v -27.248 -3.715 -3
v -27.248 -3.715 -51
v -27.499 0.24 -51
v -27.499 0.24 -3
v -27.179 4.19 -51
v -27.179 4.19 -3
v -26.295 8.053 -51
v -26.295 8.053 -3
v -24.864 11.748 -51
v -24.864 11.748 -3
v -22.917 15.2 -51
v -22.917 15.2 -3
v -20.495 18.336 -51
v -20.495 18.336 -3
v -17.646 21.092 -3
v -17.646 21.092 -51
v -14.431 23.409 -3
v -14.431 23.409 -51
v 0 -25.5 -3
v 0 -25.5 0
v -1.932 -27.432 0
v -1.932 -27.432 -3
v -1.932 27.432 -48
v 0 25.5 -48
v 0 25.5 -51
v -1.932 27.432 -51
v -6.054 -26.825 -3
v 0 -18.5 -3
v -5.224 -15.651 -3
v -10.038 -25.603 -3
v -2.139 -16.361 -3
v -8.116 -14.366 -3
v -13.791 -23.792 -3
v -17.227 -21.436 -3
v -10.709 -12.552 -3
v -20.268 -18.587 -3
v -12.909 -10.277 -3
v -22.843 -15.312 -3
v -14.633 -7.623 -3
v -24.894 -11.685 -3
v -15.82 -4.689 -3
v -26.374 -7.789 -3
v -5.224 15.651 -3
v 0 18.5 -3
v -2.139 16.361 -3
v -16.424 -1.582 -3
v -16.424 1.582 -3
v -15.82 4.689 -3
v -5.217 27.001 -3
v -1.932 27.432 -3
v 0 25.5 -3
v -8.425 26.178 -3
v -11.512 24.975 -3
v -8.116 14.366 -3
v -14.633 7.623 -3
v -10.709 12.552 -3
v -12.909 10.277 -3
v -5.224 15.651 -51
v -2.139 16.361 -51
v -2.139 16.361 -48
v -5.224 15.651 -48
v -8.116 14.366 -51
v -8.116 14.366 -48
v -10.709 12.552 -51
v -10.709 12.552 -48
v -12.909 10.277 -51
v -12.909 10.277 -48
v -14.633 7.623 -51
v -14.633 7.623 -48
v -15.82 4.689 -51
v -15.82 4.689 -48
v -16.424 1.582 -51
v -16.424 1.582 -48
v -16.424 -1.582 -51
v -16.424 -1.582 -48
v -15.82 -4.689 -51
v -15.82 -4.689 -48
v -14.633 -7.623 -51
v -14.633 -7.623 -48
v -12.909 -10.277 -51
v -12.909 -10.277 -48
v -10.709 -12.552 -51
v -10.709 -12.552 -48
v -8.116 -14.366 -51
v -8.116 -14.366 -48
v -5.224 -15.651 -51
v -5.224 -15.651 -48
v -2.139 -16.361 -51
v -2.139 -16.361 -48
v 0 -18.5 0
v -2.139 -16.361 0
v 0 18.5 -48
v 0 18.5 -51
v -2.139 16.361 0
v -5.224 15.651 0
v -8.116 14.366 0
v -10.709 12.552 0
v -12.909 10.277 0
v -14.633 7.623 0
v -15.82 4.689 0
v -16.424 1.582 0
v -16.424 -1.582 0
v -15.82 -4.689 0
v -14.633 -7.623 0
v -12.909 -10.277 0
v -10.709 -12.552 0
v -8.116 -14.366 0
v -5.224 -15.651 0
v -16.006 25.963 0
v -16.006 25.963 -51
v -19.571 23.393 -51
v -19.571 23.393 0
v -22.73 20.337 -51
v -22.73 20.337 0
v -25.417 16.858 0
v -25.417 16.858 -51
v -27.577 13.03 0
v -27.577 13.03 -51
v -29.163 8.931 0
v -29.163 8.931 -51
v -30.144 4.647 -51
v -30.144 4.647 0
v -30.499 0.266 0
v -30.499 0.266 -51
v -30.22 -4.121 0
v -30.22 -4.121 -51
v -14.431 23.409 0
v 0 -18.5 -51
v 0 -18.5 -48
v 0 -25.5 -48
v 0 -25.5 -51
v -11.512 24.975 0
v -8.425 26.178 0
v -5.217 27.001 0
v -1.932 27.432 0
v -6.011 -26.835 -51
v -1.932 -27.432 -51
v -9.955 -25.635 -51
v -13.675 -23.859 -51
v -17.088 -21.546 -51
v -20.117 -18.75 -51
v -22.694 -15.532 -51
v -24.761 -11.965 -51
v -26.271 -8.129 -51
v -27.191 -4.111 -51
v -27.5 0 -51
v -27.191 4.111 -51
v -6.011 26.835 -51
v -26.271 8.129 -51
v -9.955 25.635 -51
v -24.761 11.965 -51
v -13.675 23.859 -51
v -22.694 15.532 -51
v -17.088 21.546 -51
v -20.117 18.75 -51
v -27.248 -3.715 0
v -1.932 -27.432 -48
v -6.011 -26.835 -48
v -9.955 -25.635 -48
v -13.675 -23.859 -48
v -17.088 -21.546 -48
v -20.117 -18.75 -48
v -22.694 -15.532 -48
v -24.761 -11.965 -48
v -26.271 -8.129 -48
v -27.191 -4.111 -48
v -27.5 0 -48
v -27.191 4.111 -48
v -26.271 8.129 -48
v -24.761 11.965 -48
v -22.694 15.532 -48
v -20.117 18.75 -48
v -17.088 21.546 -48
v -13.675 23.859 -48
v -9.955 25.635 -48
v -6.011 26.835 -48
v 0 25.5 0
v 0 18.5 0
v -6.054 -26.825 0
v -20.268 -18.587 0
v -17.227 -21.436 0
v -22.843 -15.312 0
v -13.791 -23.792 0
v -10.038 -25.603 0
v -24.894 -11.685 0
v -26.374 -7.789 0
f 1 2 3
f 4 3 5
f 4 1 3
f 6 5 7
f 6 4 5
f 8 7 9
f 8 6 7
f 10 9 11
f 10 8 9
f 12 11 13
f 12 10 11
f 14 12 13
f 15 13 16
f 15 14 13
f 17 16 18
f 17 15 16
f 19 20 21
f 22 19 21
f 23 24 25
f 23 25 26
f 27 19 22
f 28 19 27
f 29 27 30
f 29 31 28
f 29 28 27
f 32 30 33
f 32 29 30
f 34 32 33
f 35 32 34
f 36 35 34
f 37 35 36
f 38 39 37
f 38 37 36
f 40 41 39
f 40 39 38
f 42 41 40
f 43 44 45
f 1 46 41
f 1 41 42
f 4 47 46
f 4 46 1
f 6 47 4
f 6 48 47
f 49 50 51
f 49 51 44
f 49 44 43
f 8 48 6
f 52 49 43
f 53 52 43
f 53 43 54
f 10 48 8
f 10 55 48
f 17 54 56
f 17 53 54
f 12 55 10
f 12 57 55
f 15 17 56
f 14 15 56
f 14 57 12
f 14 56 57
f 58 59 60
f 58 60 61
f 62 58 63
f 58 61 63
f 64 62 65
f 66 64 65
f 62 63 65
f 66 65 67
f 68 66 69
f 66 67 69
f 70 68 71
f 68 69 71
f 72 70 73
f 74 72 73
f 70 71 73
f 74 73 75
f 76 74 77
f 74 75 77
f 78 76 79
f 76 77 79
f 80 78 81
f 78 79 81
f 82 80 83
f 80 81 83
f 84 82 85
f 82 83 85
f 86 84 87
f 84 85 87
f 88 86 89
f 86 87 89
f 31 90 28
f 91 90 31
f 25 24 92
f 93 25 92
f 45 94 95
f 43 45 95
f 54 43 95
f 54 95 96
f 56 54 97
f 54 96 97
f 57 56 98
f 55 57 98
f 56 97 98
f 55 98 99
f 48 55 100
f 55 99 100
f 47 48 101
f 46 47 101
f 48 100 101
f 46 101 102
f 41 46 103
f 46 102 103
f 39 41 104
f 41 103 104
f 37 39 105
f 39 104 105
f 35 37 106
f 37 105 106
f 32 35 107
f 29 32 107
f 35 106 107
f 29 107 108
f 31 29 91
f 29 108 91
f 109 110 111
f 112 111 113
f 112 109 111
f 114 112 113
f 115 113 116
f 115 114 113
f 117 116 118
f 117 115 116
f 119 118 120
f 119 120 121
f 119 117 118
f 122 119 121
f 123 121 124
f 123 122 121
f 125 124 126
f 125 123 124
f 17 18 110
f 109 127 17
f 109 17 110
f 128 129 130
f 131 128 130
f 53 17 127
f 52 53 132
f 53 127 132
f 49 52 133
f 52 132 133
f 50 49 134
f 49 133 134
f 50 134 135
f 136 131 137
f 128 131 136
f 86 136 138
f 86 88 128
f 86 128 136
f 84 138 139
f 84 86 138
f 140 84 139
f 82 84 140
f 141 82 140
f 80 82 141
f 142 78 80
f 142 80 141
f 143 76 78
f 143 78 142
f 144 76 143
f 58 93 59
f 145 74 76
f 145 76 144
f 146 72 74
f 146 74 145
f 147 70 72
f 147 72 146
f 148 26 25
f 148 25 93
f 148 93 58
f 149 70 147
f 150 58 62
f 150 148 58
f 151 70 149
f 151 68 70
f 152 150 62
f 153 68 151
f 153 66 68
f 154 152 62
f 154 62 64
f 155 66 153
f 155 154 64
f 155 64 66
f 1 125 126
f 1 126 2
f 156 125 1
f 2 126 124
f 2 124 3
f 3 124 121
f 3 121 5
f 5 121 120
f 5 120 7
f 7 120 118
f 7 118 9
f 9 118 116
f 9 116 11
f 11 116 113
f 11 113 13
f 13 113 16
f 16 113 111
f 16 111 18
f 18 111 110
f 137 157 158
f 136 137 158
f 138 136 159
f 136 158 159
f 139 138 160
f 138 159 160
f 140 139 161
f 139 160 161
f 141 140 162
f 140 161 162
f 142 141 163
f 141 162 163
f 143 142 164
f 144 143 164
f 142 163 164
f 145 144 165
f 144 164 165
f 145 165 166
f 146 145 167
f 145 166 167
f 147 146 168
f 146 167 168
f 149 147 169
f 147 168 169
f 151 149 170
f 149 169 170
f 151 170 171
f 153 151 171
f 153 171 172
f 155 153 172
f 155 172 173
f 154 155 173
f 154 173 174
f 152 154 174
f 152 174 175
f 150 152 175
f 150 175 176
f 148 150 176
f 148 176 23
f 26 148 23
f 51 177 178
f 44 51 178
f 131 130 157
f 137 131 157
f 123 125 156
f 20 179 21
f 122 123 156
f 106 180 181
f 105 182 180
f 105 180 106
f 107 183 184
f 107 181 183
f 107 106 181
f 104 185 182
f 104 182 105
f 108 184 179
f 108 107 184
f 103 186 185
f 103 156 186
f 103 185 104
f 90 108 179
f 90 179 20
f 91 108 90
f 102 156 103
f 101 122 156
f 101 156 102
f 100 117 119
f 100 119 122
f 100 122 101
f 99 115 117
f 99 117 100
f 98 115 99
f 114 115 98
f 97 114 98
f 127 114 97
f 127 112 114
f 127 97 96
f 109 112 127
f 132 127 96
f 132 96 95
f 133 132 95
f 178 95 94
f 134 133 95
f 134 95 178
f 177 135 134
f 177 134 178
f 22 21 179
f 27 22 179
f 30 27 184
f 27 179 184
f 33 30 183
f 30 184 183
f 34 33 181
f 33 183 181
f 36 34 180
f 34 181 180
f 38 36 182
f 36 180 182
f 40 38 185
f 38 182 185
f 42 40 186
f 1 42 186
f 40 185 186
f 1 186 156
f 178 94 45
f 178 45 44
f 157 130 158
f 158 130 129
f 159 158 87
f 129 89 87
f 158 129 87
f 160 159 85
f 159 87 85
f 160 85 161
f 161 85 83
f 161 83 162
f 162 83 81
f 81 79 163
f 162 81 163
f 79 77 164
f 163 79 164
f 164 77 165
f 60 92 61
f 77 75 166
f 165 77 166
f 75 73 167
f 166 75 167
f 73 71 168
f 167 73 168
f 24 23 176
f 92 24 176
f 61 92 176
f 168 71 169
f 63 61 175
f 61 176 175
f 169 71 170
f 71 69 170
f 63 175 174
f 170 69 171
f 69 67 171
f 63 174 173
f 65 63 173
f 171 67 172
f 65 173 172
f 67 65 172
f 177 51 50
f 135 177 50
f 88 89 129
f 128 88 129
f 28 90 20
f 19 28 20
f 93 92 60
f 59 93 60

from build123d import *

# Parameters (mm, degrees)
BASE_FLANGE1_DEPTH  = 3
BOSS_EXTRUDE1_DEPTH = 51
BASE_FLANGE2_START  = -3
BASE_FLANGE2_DEPTH  = 3
CHAMFER1_SIZE       = 2
CHAMFER2_SIZE       = 2


# Sheet-metal steps are written as plain solids
with BuildPart() as part:
    # Base-Flange1: sheet metal written as solids
    # Sketch1 → Base-Flange1 (new body)
    with BuildSketch(Plane.XY):
        with BuildLine():
            Line((0, 27.5), (0, 16.5))
            ThreePointArc((0, 16.5), (-16.5, 0), (0, -16.5))
            Line((0, -16.5), (0, -27.5))
            ThreePointArc((0, -27.5), (-27.5, 0), (0, 27.5))
        make_face()
    extrude(amount=-BASE_FLANGE1_DEPTH)

    # Sketch6 → Boss-Extrude1 (add)
    with BuildSketch(Plane.XY):
        with BuildLine():
            Line((-14.431370788, 23.409090909), (-16.005702146, 25.962809917))
            ThreePointArc((-16.005702146, 25.962809917), (-27.576558365, 13.030097036), (-30.220353458, -4.120708299))
            Line((-30.220353458, -4.120708299), (-27.247859675, -3.715392728))
            ThreePointArc((-27.247859675, -3.715392728), (-24.864110001, 11.748448147), (-14.431370788, 23.409090909))
        make_face()
    extrude(amount=-BOSS_EXTRUDE1_DEPTH)

    # Chamfer1
    # the kernel refuses this chamfer: 2 mm, written as the material it takes off along each edge
    with BuildSketch(Plane(origin=(0, 27.5, 5.143365976), x_dir=(0, -1, 0), z_dir=(0, 0, -1))) as chamfer1_piece_1:
        with BuildLine():
            Line((CHAMFER1_SIZE, 0), (0.06795314, 1.93204686))
            ThreePointArc((0.06795314, 1.93204686), (0.017965239, 0.993863861), (0, 0))
            Line((0, 0), (CHAMFER1_SIZE, 0))
        make_face()
    extrude(amount=13.286731952, mode=Mode.SUBTRACT)
    with BuildSketch(Plane(origin=(0, 16.5, 5.511382139), x_dir=(-0.9978876375482535, -0.06496354999817457, 0), z_dir=(0, 0, -1))) as chamfer1_piece_2:
        with BuildLine():
            Line((2.14379715, 0), (-CHAMFER1_SIZE * 0.0649635499982, CHAMFER1_SIZE * 0.997887637548))
            Line((-CHAMFER1_SIZE * 0.0649635499982, CHAMFER1_SIZE * 0.997887637548), (0, 0))
            ThreePointArc((0, 0), (1.102072489, 0.034826391), (2.14379715, 0))
        make_face()
    extrude(amount=14.022764278, mode=Mode.SUBTRACT)
    with BuildSketch(Plane(origin=(0, -16.5, 5.511382139), x_dir=(0, -1, 0), z_dir=(0, 0, -1))) as chamfer1_piece_3:
        with BuildLine():
            Line((CHAMFER1_SIZE, 0), (-0.139268673, 2.139268673))
            ThreePointArc((-0.139268673, 2.139268673), (-0.036841717, 1.102006958), (0, 0))
            Line((0, 0), (CHAMFER1_SIZE, 0))
        make_face()
    extrude(amount=14.022764278, mode=Mode.SUBTRACT)
    with BuildSketch(Plane(origin=(0, -27.5, 5.143365976), x_dir=(0, 1, 0), z_dir=(0, 0, -1))) as chamfer1_piece_4:
        with BuildLine():
            Line((CHAMFER1_SIZE, 0), (0.06795314, -1.93204686))
            ThreePointArc((0.06795314, -1.93204686), (0.017965239, -0.993863861), (0, 0))
            Line((0, 0), (CHAMFER1_SIZE, 0))
        make_face()
    extrude(amount=13.286731952, mode=Mode.SUBTRACT)


with BuildPart() as body_2:
    # Base-Flange2: sheet metal written as solids
    # Sketch7 → Base-Flange2 (new body)
    with BuildSketch(Plane(origin=(0, 0, -51), x_dir=(-1, 0, 0), z_dir=(0, 0, -1)).offset(BASE_FLANGE2_START)):
        with BuildLine():
            Line((0, 27.5), (0, 16.5))
            ThreePointArc((0, 16.5), (16.5, 0), (0, -16.5))
            Line((0, -16.5), (0, -27.5))
            ThreePointArc((0, -27.5), (27.5, 0), (0, 27.5))
        make_face()
    extrude(amount=BASE_FLANGE2_DEPTH)

    # Chamfer2
    # the kernel refuses this chamfer: 2 mm, written as the material it takes off along each edge
    with BuildSketch(Plane(origin=(0, -27.5, -42.856634024), x_dir=(0, 1, 0), z_dir=(0, 0, -1))) as chamfer2_piece_1:
        with BuildLine():
            Line((CHAMFER2_SIZE, 0), (0.06795314, -1.93204686))
            ThreePointArc((0.06795314, -1.93204686), (0.017965239, -0.993863861), (0, 0))
            Line((0, 0), (CHAMFER2_SIZE, 0))
        make_face()
    extrude(amount=13.286731952, mode=Mode.SUBTRACT)
    with BuildSketch(Plane(origin=(0, -16.5, -42.488617861), x_dir=(-0.9978876375482537, 0.06496354999817457, 0), z_dir=(0, 0, -1))) as chamfer2_piece_2:
        with BuildLine():
            Line((2.14379715, 0), (-CHAMFER2_SIZE * 0.0649635499982, -CHAMFER2_SIZE * 0.997887637548))
            Line((-CHAMFER2_SIZE * 0.0649635499982, -CHAMFER2_SIZE * 0.997887637548), (0, 0))
            ThreePointArc((0, 0), (1.102072489, -0.034826391), (2.14379715, 0))
        make_face()
    extrude(amount=14.022764278, mode=Mode.SUBTRACT)
    with BuildSketch(Plane(origin=(0, 16.5, -42.488617861), x_dir=(0, 1, 0), z_dir=(0, 0, -1))) as chamfer2_piece_3:
        with BuildLine():
            Line((CHAMFER2_SIZE, 0), (-0.139268673, -2.139268673))
            ThreePointArc((-0.139268673, -2.139268673), (-0.036841717, -1.102006958), (0, 0))
            Line((0, 0), (CHAMFER2_SIZE, 0))
        make_face()
    extrude(amount=14.022764278, mode=Mode.SUBTRACT)
    with BuildSketch(Plane(origin=(0, 27.5, -42.856634024), x_dir=(0, -1, 0), z_dir=(0, 0, -1))) as chamfer2_piece_4:
        with BuildLine():
            Line((CHAMFER2_SIZE, 0), (0.06795314, 1.93204686))
            ThreePointArc((0.06795314, 1.93204686), (0.017965239, 0.993863861), (0, 0))
            Line((0, 0), (CHAMFER2_SIZE, 0))
        make_face()
    extrude(amount=13.286731952, mode=Mode.SUBTRACT)


solid = Compound([part.part, body_2.part])
